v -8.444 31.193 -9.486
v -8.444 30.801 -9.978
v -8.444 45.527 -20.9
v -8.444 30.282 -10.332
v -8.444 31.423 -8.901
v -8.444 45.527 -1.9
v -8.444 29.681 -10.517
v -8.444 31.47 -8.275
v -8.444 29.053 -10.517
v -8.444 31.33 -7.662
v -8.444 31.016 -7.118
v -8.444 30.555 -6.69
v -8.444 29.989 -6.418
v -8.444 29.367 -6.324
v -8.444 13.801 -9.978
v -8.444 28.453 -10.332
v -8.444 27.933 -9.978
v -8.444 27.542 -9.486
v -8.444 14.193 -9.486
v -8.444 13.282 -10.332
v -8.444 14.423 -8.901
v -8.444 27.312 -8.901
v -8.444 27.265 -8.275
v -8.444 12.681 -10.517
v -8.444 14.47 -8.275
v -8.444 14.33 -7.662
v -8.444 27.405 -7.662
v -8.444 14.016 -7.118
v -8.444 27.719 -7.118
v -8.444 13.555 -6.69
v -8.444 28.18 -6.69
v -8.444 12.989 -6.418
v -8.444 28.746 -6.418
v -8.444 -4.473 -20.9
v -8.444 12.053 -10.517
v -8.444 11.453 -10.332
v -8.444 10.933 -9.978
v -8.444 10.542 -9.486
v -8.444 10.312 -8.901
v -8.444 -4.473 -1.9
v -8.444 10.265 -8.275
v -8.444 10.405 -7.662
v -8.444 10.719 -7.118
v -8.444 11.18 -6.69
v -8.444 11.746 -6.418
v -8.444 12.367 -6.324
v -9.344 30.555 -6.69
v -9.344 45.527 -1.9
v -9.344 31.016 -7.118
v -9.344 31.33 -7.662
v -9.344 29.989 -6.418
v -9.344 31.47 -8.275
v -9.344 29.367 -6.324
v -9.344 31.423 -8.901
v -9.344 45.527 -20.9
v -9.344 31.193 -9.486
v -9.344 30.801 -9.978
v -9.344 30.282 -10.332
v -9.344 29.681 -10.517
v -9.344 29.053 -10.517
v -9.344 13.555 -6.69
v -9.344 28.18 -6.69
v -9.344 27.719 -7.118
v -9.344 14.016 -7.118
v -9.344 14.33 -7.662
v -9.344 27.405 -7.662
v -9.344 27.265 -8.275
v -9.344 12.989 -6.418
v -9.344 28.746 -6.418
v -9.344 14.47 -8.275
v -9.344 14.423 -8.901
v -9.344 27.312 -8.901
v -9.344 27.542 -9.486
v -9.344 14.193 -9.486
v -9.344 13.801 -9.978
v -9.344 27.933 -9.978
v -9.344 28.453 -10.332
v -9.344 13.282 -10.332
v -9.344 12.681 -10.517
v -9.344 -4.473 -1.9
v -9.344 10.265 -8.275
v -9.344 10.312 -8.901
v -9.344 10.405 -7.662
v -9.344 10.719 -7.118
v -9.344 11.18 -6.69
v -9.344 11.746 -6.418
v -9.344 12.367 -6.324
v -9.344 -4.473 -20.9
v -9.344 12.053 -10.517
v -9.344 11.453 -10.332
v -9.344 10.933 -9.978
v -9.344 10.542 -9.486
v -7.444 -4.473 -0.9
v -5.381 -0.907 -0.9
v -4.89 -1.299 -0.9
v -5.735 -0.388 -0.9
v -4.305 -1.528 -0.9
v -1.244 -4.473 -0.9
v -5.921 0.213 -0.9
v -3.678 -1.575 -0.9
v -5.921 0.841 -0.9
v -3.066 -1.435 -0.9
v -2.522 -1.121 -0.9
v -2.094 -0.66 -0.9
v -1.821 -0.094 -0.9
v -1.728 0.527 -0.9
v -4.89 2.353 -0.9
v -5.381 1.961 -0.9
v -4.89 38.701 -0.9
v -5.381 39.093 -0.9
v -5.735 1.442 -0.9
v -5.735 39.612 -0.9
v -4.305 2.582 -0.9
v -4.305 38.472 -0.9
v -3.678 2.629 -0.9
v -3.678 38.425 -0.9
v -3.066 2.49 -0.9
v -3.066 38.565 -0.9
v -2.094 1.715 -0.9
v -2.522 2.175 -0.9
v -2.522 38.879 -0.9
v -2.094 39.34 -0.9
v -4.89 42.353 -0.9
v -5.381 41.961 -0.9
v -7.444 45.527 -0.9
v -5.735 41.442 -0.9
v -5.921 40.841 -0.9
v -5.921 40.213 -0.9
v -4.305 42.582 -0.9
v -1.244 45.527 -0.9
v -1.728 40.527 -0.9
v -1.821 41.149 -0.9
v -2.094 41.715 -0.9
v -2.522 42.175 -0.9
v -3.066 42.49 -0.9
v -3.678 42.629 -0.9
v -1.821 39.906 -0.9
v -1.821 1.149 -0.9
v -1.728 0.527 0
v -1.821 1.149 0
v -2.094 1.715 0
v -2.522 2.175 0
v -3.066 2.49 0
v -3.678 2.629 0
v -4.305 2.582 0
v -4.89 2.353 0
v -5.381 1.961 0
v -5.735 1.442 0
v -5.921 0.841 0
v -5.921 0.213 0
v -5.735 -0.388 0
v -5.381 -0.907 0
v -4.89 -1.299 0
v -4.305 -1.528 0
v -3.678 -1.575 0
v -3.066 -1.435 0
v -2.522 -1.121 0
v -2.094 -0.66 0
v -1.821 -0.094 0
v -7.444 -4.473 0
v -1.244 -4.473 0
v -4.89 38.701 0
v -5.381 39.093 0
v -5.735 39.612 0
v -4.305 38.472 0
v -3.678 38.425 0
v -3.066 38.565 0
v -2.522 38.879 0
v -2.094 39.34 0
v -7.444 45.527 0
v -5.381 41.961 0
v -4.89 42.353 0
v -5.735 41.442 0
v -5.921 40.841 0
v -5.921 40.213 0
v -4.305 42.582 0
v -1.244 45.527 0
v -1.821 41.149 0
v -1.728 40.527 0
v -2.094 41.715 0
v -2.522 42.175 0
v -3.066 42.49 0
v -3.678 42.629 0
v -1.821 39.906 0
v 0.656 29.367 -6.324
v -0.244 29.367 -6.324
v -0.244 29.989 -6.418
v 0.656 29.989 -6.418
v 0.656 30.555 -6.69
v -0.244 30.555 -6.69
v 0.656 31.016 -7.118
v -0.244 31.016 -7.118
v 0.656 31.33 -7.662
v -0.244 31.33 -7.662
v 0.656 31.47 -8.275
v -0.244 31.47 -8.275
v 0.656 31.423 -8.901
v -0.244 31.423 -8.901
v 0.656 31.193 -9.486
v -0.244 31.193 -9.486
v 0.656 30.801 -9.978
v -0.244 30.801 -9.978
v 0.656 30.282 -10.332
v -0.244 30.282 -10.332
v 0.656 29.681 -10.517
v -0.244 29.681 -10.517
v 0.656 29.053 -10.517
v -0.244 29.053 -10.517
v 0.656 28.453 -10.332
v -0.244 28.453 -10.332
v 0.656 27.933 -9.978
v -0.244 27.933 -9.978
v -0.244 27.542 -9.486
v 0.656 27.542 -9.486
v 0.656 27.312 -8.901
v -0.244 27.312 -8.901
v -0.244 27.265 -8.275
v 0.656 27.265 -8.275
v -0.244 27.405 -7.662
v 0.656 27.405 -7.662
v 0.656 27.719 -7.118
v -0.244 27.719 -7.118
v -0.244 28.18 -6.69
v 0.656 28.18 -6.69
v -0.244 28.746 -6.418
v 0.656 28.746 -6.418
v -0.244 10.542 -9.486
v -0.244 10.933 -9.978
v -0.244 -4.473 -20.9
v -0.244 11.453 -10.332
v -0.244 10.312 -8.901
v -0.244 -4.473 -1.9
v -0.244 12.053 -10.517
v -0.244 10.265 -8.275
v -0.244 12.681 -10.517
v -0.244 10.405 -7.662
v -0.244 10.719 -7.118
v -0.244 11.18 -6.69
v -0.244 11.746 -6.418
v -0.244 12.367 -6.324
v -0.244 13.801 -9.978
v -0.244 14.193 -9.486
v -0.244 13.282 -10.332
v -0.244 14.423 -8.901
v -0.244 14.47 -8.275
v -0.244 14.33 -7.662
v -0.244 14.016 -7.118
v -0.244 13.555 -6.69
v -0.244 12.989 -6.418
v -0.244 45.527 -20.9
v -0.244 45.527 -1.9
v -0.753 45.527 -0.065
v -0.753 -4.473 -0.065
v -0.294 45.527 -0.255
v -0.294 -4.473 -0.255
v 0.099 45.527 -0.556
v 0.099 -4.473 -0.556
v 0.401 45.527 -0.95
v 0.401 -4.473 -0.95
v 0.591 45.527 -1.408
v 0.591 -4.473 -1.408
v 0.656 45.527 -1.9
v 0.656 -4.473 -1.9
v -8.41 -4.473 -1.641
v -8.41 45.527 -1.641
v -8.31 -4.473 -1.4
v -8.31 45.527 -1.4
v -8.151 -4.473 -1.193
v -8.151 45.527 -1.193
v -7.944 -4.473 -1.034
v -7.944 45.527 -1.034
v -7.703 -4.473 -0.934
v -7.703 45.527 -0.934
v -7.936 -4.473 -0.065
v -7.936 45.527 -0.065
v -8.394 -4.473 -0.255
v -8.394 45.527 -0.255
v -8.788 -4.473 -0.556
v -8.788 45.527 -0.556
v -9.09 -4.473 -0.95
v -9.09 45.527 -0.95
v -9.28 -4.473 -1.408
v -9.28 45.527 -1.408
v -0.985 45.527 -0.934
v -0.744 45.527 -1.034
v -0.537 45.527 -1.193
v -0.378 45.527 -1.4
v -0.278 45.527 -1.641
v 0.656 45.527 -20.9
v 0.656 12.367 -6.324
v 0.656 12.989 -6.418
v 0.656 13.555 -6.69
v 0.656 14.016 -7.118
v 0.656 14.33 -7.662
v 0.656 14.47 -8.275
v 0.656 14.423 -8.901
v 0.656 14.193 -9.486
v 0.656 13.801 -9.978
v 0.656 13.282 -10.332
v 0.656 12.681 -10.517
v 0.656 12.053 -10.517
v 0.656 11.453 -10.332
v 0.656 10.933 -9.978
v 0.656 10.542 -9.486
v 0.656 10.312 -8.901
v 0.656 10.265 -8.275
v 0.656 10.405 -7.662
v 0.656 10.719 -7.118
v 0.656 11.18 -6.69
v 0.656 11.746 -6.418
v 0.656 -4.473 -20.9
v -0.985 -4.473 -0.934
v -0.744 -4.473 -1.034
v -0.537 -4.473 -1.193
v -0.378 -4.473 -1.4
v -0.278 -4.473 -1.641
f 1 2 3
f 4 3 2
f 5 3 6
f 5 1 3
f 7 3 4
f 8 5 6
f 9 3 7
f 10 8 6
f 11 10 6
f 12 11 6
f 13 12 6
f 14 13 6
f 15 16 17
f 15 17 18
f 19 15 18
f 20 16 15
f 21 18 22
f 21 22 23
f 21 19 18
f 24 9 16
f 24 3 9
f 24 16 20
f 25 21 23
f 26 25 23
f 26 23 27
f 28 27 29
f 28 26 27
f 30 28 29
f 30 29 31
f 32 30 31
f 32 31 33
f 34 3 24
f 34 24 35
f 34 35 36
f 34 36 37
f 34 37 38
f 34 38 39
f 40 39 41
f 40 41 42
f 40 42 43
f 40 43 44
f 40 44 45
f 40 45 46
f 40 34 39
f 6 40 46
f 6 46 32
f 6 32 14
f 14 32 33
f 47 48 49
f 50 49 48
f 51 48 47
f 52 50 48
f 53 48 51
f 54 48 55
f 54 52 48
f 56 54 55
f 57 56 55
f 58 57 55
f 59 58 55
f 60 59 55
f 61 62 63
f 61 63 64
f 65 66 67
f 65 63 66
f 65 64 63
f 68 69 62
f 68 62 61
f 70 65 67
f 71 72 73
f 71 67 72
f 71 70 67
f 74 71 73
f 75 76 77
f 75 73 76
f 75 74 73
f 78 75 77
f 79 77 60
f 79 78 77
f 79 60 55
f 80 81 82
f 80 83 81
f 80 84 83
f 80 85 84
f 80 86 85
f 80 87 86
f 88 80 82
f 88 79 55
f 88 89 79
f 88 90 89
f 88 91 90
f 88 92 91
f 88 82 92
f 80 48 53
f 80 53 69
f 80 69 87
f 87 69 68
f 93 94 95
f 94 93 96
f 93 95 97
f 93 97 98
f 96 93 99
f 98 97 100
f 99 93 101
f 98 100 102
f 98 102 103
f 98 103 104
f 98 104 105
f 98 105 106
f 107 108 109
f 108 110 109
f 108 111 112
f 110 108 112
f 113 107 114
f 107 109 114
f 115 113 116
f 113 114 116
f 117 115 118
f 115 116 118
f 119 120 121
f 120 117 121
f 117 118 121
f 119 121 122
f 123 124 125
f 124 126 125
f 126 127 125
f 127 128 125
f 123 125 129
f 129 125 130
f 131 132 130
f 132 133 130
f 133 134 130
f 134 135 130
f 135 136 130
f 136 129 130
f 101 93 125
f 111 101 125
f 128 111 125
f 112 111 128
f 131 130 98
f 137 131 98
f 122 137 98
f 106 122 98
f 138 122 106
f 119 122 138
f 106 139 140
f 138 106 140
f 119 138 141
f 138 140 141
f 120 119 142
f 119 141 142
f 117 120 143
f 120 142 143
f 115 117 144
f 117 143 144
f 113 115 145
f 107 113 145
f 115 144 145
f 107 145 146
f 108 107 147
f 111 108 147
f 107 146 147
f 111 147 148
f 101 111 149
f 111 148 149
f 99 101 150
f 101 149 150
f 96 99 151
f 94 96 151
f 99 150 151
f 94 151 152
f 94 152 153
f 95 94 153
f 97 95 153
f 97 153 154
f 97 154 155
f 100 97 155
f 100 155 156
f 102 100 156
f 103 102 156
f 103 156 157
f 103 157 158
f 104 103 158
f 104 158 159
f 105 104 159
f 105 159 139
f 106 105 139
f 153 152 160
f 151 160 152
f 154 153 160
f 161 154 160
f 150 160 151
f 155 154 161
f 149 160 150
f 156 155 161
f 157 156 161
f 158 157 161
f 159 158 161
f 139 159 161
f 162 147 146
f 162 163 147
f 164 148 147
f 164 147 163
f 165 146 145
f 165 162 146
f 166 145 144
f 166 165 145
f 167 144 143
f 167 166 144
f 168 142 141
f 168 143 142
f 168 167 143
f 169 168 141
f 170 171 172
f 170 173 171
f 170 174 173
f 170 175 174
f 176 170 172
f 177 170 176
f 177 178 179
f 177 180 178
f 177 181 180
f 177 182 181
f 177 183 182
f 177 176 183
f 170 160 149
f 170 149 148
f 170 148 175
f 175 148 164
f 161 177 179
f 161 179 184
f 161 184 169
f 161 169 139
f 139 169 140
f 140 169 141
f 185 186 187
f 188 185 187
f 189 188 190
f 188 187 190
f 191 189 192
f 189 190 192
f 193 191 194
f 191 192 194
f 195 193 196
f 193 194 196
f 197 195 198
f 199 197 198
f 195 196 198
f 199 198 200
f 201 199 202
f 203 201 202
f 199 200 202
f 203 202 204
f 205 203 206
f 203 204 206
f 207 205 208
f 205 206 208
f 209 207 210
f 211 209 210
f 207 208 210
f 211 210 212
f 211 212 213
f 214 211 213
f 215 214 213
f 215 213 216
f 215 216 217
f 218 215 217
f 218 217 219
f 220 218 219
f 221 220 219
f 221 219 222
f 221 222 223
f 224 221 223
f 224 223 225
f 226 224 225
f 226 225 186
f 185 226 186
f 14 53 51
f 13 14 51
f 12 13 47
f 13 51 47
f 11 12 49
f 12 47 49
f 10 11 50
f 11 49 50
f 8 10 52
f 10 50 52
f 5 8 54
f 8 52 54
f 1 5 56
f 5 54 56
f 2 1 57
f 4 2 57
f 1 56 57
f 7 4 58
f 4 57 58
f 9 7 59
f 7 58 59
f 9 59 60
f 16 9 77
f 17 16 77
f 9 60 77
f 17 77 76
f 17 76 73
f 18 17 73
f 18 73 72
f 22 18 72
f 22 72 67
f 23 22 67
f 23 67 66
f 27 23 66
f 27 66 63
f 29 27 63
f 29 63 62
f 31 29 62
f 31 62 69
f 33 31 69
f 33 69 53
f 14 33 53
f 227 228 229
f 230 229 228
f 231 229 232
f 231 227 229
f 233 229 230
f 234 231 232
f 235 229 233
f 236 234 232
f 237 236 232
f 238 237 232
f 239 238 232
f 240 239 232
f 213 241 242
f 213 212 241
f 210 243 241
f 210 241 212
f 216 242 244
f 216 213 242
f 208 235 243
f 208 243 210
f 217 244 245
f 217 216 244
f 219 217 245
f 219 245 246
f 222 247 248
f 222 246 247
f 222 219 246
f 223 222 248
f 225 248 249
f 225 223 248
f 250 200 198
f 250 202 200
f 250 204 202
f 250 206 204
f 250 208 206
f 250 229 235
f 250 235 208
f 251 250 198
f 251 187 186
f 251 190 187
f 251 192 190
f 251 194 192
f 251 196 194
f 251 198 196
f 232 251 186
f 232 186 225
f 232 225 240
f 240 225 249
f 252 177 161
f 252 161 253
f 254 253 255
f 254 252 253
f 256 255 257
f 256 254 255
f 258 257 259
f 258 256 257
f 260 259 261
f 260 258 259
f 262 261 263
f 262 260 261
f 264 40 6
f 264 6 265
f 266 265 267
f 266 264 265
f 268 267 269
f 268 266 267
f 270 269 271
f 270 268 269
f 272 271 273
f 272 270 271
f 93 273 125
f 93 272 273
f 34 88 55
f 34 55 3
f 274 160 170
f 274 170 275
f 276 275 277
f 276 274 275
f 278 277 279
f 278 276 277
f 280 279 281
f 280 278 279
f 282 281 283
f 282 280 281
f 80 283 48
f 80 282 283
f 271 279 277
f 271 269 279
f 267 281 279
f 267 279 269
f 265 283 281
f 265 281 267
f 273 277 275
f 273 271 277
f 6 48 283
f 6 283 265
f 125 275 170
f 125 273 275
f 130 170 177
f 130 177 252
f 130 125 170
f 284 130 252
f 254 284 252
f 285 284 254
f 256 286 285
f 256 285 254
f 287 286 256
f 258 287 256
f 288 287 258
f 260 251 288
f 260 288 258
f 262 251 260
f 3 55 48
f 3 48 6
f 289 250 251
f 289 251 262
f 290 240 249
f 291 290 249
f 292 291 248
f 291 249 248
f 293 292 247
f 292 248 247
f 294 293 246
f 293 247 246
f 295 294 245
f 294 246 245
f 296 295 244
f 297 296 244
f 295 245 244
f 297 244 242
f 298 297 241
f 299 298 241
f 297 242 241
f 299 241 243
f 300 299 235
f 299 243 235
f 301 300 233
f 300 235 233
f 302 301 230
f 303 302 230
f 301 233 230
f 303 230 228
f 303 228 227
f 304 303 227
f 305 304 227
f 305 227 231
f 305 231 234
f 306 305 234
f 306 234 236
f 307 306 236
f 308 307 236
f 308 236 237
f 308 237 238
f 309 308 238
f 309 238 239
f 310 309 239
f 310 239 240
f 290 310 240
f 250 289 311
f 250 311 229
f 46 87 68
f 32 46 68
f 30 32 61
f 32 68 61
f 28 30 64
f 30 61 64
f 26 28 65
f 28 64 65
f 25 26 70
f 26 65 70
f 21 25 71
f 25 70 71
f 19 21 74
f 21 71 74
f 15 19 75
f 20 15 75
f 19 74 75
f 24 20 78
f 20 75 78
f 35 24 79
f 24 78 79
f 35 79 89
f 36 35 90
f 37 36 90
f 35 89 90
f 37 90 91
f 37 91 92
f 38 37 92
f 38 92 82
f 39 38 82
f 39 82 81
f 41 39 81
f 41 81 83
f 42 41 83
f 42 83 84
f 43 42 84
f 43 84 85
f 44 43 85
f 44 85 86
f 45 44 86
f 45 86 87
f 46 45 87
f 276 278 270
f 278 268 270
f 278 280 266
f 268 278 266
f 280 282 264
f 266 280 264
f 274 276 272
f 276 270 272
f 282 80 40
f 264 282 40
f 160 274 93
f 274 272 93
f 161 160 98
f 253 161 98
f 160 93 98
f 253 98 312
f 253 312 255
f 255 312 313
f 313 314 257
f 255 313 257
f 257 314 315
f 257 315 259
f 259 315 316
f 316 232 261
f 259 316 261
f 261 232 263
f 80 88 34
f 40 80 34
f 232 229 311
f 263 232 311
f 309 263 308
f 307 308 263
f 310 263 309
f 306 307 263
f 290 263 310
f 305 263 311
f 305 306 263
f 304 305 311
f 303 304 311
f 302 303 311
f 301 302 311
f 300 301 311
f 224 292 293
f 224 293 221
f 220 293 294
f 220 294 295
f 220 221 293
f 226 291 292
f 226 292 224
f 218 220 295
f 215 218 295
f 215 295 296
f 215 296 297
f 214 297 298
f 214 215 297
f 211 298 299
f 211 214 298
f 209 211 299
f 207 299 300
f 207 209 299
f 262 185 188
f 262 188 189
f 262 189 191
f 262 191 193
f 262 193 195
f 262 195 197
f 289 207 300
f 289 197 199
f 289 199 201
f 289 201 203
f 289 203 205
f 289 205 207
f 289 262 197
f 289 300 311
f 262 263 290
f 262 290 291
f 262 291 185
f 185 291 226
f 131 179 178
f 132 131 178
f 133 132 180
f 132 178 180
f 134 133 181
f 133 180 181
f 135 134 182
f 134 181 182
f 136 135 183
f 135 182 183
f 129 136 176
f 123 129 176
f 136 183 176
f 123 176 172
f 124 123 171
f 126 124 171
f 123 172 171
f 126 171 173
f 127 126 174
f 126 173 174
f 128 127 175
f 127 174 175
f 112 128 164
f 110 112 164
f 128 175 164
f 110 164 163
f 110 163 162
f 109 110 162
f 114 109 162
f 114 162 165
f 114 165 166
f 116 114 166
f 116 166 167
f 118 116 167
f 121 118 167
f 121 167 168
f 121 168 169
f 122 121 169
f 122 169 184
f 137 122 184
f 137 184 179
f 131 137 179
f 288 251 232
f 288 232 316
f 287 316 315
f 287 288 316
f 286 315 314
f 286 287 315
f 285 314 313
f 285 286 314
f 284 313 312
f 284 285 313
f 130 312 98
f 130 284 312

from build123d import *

# Parameters (mm, degrees)
SKETCH1_W                    = 8.2
SKETCH1_H                    = 50
BASE_FLANGE1_DEPTH           = 0.9
EDGE_FLANGE2_STRIP_W         = 5.6
EDGE_FLANGE2_STRIP_H         = 0.9
EDGE_FLANGE2_STRIP_CUT_DEPTH = 50
EDGE_FLANGE2_DEPTH           = 50
EDGE_FLANGE5_STRIP_W         = 5.6
EDGE_FLANGE5_STRIP_H         = 0.9
EDGE_FLANGE5_STRIP_CUT_DEPTH = 50
EDGE_FLANGE5_DEPTH           = 50
F_19_0_166_DIAMETER_SLOT1_D  = 4.2164
F_19_0_166_DIAMETER_SLOT2_D  = 4.2164


# Sheet-metal steps are written as plain solids
with BuildPart() as part:
    # Sketch1 → Base-Flange1 (new body)
    with BuildSketch(Plane.XY):
        with Locations((-4.344277108, 20.527108434)):
            Rectangle(SKETCH1_W, SKETCH1_H)
    extrude(amount=-BASE_FLANGE1_DEPTH)

    # Edge-Flange2 strip (across the edge) → Edge-Flange2 strip cut (cut)
    with BuildSketch(Plane(origin=(-8.444277108, -4.472891566, -0.9), x_dir=(1, 0, 0), z_dir=(0, 1, 0))):
        with Locations((-1.8, -0.45)):
            Rectangle(EDGE_FLANGE2_STRIP_W, EDGE_FLANGE2_STRIP_H)
    extrude(amount=EDGE_FLANGE2_STRIP_CUT_DEPTH, mode=Mode.SUBTRACT)

    # Edge-Flange2 section (across the edge) → Edge-Flange2 (add)
    with BuildSketch(Plane(origin=(-8.444277108, -4.472891566, -0.9), x_dir=(1, 0, 0), z_dir=(0, 1, 0))):
        with BuildLine():
            Line((-0.9, 1), (-0.9, 20))
            Line((-0.9, 20), (0, 20))
            Line((0, 20), (0, 1))
            ThreePointArc((0, 1), (0.292893219, 0.292893219), (1, 0))
            Line((1, 0), (1, -0.9))
            ThreePointArc((1, -0.9), (-0.343502884, -0.343502884), (-0.9, 1))
        make_face()
    extrude(amount=EDGE_FLANGE2_DEPTH)

    # Edge-Flange5 strip (across the edge) → Edge-Flange5 strip cut (cut)
    with BuildSketch(Plane(origin=(-0.244277108, 45.527108434, -0.9), x_dir=(-1, 0, 0), z_dir=(0, -1, 0))):
        with Locations((-1.8, -0.45)):
            Rectangle(EDGE_FLANGE5_STRIP_W, EDGE_FLANGE5_STRIP_H)
    extrude(amount=EDGE_FLANGE5_STRIP_CUT_DEPTH, mode=Mode.SUBTRACT)

    # Edge-Flange5 section (across the edge) → Edge-Flange5 (add)
    with BuildSketch(Plane(origin=(-0.244277108, 45.527108434, -0.9), x_dir=(-1, 0, 0), z_dir=(0, -1, 0))):
        with BuildLine():
            Line((-0.9, 1), (-0.9, 20))
            Line((-0.9, 20), (0, 20))
            Line((0, 20), (0, 1))
            ThreePointArc((0, 1), (0.292893219, 0.292893219), (1, 0))
            Line((1, 0), (1, -0.9))
            ThreePointArc((1, -0.9), (-0.343502884, -0.343502884), (-0.9, 1))
        make_face()
    extrude(amount=EDGE_FLANGE5_DEPTH)

    # #19 (0.166) Diameter Slot1 (through all)
    with Locations(Plane(origin=(0, 0, -0.9), x_dir=(-1, 0, 0), z_dir=(0, 0, -1))):
        with Locations((3.836019002, 40.527108434), (3.836019002, 0.527108434)):
            Hole(F_19_0_166_DIAMETER_SLOT1_D / 2)

    # #19 (0.166) Diameter Slot2 (through all)
    with Locations(Plane(origin=(0.655722892, 0, 0), x_dir=(0, 0, -1), z_dir=(1, 0, 0))):
        with Locations((8.432080696, 29.367284102), (8.432080696, 12.367284102)):
            Hole(F_19_0_166_DIAMETER_SLOT2_D / 2)


solid = part.part
